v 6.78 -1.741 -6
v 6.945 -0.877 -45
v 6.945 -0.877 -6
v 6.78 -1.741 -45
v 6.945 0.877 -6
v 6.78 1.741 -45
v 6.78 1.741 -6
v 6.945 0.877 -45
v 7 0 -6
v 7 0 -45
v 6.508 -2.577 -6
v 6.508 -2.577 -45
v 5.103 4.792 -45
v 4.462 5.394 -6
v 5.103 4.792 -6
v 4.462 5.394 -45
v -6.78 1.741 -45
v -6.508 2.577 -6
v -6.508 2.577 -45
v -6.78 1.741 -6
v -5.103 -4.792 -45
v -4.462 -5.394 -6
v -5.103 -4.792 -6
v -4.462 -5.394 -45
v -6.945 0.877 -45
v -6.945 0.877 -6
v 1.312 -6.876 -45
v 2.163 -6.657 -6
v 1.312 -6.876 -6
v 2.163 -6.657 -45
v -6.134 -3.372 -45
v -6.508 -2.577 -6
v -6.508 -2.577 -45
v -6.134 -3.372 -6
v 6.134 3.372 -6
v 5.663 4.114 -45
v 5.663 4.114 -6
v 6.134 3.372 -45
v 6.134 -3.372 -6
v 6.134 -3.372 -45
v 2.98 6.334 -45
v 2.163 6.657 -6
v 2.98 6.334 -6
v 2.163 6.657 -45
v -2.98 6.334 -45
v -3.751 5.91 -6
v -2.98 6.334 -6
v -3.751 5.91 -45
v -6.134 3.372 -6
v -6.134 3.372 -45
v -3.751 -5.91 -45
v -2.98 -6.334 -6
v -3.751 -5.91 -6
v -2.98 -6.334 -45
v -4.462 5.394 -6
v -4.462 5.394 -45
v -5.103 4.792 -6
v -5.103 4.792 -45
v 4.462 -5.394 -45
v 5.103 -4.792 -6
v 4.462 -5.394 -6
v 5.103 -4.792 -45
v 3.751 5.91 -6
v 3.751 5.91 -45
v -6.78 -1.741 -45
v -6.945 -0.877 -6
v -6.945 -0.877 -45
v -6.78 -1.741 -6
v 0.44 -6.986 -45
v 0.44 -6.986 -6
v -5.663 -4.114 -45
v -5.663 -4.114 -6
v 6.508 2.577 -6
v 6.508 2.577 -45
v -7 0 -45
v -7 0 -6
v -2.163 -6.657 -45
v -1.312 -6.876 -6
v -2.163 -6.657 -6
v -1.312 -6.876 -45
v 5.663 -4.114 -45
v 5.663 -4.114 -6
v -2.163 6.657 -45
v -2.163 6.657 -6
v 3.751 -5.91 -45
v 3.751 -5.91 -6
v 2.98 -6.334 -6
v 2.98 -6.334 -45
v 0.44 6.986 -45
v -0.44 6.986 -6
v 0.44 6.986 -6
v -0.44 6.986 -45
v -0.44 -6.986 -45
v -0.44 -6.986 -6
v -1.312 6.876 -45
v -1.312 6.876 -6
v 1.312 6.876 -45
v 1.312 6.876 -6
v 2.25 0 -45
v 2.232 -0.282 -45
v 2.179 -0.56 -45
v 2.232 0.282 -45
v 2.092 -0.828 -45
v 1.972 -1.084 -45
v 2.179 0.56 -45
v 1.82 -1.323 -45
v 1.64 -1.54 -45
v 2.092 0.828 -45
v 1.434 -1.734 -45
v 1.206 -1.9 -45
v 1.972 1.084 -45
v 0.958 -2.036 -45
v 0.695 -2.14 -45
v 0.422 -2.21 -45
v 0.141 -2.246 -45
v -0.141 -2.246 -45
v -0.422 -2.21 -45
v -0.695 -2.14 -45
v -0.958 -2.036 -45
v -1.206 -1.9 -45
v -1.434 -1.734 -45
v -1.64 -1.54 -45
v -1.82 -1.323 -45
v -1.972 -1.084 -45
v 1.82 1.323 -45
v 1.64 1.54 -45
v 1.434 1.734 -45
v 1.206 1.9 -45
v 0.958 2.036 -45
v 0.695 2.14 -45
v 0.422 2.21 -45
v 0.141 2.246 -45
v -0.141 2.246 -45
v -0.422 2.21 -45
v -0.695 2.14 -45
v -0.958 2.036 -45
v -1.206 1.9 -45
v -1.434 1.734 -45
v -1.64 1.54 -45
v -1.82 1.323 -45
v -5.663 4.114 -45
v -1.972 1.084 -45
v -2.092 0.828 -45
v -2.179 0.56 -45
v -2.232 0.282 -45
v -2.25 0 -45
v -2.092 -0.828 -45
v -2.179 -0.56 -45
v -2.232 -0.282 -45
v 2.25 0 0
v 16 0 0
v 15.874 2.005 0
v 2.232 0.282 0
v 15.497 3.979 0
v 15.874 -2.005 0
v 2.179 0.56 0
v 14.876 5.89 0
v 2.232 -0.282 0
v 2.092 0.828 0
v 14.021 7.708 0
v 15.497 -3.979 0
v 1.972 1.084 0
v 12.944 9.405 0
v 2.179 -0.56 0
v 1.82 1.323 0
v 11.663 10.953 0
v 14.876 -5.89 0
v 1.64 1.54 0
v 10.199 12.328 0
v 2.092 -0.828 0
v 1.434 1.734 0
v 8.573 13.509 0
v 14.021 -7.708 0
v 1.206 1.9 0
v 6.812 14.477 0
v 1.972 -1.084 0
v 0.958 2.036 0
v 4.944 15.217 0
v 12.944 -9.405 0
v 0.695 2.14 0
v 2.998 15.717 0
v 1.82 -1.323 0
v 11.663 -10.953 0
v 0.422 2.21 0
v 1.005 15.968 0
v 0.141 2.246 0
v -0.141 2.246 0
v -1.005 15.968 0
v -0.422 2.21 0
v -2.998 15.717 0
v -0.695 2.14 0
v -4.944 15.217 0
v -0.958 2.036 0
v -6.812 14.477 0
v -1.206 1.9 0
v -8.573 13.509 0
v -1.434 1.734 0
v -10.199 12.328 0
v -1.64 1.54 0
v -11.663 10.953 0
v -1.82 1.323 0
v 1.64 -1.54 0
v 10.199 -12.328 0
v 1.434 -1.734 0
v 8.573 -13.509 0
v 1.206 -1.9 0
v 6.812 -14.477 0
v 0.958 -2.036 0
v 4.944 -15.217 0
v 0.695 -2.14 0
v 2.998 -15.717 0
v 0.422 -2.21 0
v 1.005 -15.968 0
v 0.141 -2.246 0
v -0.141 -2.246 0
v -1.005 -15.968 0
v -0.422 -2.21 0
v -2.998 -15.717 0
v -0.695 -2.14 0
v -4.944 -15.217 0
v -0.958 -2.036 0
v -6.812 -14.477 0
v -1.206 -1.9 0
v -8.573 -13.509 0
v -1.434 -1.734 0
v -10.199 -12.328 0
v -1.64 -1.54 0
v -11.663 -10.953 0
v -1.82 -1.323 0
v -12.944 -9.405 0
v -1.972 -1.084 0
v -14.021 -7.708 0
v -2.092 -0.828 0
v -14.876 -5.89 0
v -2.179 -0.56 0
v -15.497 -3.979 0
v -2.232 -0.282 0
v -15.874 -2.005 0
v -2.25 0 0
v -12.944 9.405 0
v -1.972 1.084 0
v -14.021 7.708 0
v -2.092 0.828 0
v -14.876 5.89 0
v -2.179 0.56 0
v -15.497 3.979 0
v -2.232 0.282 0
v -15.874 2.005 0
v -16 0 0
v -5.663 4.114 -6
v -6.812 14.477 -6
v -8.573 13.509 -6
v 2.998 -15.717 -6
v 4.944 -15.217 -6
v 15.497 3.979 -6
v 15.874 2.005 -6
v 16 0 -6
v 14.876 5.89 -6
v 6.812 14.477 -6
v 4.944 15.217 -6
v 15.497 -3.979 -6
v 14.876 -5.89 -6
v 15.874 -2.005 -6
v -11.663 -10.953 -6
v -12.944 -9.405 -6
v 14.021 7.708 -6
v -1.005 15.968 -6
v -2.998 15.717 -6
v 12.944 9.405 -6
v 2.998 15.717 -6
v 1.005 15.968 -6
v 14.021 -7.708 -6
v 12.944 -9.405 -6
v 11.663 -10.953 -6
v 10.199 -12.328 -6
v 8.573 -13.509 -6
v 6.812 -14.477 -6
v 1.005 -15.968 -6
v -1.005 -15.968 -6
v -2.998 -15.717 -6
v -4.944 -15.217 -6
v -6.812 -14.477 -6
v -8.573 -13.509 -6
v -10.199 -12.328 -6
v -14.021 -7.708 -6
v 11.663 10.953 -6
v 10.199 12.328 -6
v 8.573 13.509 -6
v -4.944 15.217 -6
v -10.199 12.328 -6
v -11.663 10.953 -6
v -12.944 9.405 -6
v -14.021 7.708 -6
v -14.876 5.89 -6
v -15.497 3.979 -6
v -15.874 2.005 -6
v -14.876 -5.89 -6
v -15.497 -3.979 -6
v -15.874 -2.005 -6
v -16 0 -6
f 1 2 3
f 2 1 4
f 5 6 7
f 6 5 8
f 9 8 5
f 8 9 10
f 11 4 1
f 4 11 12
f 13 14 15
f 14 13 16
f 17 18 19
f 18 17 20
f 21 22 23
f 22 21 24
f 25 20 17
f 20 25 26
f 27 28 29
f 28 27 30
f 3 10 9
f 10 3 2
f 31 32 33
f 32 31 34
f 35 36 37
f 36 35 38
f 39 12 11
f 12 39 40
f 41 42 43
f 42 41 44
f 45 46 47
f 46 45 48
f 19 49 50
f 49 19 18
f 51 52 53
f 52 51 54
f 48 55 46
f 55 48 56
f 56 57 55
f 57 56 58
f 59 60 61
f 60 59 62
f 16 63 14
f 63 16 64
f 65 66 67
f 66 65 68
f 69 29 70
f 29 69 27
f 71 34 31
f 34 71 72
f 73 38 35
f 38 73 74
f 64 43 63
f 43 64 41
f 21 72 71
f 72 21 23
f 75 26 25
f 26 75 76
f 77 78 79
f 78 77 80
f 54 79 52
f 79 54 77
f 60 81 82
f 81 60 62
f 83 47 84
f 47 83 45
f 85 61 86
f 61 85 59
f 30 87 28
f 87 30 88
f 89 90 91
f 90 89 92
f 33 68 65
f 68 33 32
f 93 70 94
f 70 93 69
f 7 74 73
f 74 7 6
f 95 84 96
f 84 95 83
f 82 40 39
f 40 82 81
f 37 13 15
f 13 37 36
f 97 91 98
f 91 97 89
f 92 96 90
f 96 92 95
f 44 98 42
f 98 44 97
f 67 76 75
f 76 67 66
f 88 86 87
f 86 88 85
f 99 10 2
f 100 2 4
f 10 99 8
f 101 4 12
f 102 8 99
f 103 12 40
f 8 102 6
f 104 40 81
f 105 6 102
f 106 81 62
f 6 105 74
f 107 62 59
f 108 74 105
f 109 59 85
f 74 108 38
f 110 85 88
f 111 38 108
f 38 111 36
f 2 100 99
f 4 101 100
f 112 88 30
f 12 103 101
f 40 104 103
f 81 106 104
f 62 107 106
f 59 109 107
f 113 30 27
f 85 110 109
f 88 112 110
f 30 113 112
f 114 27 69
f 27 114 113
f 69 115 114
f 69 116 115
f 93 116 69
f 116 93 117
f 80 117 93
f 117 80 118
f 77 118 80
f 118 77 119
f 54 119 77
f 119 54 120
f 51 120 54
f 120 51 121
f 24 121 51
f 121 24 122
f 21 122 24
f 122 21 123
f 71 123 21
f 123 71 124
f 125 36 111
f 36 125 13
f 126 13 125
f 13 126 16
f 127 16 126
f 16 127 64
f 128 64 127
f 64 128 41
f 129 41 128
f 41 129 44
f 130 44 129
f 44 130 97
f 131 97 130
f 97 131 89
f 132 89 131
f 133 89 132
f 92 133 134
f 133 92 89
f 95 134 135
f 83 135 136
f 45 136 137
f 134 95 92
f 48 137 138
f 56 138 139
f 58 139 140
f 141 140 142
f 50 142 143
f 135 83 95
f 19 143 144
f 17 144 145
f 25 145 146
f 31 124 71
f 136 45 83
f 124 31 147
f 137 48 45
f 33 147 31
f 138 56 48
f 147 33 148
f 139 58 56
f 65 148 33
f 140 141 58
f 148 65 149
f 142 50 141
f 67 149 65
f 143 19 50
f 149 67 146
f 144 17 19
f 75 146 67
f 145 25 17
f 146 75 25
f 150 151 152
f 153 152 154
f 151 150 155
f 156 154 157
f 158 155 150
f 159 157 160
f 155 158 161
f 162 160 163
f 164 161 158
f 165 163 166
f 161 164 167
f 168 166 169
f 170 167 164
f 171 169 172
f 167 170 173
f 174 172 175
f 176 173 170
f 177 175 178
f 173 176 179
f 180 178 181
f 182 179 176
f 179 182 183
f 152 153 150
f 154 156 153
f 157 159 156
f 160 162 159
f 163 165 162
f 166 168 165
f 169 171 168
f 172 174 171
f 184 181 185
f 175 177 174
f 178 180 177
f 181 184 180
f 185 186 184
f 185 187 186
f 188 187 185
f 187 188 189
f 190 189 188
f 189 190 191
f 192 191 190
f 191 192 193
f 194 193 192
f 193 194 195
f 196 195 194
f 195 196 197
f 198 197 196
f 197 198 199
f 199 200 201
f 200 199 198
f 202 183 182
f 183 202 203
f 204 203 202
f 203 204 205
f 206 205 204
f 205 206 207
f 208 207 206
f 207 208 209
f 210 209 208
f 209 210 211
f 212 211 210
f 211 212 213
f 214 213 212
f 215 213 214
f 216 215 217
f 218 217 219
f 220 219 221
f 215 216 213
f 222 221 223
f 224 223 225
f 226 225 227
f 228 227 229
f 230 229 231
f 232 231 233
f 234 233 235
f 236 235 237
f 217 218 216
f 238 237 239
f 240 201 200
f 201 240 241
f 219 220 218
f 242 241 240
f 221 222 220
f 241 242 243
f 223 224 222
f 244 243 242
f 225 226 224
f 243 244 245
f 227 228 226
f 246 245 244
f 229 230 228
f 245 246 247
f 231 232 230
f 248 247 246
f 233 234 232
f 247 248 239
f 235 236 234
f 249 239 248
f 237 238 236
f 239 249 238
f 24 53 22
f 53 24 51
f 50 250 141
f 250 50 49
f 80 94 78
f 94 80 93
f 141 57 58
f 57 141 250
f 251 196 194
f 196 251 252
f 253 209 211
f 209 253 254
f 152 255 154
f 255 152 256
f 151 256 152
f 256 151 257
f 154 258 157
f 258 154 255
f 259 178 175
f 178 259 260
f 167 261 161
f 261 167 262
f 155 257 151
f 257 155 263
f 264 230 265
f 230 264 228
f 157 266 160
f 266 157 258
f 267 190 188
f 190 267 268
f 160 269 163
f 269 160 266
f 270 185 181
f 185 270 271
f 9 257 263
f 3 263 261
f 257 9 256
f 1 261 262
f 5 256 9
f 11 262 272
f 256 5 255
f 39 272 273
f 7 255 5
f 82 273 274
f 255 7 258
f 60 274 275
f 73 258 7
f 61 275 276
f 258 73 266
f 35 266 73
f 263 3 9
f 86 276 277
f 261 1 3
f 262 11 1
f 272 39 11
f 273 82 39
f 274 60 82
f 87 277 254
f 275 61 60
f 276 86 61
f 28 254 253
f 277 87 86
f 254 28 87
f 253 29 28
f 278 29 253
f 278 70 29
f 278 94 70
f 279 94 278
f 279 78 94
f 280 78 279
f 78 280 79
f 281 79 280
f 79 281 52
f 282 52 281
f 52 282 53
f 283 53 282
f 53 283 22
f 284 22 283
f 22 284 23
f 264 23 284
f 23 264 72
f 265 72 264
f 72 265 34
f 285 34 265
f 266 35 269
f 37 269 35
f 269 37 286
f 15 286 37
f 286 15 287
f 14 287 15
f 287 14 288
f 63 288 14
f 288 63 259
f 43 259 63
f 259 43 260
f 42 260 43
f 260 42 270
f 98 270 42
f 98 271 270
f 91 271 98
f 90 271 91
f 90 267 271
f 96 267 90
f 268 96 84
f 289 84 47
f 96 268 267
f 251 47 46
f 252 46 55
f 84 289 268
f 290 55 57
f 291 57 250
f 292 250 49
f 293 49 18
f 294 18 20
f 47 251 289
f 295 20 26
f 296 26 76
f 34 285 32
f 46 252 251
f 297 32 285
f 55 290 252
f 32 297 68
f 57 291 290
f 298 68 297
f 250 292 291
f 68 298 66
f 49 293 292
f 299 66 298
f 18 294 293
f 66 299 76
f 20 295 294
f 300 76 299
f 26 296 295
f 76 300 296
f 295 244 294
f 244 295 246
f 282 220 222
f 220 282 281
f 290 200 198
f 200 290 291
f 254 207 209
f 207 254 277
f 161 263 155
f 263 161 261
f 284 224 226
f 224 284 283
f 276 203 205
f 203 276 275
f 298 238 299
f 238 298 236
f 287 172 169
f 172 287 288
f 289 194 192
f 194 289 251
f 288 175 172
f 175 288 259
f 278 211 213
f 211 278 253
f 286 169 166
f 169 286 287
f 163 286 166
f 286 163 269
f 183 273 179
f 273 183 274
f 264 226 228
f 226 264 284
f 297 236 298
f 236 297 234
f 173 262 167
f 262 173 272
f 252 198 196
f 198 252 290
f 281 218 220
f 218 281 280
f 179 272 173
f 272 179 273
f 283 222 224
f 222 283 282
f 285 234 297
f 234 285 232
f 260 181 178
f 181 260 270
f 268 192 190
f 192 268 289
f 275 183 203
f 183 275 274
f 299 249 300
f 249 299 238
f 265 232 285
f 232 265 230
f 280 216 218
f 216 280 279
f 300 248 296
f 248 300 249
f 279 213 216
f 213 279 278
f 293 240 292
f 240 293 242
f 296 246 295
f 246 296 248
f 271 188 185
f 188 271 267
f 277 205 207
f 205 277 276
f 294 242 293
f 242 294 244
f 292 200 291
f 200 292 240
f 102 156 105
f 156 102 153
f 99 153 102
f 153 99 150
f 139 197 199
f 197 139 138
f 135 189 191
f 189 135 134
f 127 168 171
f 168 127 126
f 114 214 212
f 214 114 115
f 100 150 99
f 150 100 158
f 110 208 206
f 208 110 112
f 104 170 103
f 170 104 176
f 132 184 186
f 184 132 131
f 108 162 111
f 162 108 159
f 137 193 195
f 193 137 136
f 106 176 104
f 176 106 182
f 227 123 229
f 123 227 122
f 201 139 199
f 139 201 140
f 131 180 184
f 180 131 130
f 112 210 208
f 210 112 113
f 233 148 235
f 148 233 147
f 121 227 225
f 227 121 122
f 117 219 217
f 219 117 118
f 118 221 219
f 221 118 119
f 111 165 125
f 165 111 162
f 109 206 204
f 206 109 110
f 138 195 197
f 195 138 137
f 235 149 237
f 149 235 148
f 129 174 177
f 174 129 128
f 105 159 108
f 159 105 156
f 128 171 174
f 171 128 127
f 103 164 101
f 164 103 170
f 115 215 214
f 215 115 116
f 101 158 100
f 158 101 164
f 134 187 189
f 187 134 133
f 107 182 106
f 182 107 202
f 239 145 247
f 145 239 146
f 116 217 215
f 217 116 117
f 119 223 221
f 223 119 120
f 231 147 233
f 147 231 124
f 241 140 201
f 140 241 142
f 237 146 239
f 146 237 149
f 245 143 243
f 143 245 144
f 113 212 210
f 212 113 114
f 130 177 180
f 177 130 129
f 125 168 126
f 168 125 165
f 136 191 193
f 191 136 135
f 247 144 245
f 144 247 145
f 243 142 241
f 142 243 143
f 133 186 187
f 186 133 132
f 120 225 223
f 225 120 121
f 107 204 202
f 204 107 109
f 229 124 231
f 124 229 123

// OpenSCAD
$fn = 50;


difference() {
	union() {
		translate(v = [0, 0, -45.0000000000]) {
			cylinder(h = 45, r = 7.0000000000);
		}
		translate(v = [0, 0, -6.0000000000]) {
			cylinder(h = 6, r = 16.0000000000);
		}
	}
	union() {
		#translate(v = [0, 0, -45]) {
			cylinder(h = 45, r = 2.2500000000);
		}
	}
}
